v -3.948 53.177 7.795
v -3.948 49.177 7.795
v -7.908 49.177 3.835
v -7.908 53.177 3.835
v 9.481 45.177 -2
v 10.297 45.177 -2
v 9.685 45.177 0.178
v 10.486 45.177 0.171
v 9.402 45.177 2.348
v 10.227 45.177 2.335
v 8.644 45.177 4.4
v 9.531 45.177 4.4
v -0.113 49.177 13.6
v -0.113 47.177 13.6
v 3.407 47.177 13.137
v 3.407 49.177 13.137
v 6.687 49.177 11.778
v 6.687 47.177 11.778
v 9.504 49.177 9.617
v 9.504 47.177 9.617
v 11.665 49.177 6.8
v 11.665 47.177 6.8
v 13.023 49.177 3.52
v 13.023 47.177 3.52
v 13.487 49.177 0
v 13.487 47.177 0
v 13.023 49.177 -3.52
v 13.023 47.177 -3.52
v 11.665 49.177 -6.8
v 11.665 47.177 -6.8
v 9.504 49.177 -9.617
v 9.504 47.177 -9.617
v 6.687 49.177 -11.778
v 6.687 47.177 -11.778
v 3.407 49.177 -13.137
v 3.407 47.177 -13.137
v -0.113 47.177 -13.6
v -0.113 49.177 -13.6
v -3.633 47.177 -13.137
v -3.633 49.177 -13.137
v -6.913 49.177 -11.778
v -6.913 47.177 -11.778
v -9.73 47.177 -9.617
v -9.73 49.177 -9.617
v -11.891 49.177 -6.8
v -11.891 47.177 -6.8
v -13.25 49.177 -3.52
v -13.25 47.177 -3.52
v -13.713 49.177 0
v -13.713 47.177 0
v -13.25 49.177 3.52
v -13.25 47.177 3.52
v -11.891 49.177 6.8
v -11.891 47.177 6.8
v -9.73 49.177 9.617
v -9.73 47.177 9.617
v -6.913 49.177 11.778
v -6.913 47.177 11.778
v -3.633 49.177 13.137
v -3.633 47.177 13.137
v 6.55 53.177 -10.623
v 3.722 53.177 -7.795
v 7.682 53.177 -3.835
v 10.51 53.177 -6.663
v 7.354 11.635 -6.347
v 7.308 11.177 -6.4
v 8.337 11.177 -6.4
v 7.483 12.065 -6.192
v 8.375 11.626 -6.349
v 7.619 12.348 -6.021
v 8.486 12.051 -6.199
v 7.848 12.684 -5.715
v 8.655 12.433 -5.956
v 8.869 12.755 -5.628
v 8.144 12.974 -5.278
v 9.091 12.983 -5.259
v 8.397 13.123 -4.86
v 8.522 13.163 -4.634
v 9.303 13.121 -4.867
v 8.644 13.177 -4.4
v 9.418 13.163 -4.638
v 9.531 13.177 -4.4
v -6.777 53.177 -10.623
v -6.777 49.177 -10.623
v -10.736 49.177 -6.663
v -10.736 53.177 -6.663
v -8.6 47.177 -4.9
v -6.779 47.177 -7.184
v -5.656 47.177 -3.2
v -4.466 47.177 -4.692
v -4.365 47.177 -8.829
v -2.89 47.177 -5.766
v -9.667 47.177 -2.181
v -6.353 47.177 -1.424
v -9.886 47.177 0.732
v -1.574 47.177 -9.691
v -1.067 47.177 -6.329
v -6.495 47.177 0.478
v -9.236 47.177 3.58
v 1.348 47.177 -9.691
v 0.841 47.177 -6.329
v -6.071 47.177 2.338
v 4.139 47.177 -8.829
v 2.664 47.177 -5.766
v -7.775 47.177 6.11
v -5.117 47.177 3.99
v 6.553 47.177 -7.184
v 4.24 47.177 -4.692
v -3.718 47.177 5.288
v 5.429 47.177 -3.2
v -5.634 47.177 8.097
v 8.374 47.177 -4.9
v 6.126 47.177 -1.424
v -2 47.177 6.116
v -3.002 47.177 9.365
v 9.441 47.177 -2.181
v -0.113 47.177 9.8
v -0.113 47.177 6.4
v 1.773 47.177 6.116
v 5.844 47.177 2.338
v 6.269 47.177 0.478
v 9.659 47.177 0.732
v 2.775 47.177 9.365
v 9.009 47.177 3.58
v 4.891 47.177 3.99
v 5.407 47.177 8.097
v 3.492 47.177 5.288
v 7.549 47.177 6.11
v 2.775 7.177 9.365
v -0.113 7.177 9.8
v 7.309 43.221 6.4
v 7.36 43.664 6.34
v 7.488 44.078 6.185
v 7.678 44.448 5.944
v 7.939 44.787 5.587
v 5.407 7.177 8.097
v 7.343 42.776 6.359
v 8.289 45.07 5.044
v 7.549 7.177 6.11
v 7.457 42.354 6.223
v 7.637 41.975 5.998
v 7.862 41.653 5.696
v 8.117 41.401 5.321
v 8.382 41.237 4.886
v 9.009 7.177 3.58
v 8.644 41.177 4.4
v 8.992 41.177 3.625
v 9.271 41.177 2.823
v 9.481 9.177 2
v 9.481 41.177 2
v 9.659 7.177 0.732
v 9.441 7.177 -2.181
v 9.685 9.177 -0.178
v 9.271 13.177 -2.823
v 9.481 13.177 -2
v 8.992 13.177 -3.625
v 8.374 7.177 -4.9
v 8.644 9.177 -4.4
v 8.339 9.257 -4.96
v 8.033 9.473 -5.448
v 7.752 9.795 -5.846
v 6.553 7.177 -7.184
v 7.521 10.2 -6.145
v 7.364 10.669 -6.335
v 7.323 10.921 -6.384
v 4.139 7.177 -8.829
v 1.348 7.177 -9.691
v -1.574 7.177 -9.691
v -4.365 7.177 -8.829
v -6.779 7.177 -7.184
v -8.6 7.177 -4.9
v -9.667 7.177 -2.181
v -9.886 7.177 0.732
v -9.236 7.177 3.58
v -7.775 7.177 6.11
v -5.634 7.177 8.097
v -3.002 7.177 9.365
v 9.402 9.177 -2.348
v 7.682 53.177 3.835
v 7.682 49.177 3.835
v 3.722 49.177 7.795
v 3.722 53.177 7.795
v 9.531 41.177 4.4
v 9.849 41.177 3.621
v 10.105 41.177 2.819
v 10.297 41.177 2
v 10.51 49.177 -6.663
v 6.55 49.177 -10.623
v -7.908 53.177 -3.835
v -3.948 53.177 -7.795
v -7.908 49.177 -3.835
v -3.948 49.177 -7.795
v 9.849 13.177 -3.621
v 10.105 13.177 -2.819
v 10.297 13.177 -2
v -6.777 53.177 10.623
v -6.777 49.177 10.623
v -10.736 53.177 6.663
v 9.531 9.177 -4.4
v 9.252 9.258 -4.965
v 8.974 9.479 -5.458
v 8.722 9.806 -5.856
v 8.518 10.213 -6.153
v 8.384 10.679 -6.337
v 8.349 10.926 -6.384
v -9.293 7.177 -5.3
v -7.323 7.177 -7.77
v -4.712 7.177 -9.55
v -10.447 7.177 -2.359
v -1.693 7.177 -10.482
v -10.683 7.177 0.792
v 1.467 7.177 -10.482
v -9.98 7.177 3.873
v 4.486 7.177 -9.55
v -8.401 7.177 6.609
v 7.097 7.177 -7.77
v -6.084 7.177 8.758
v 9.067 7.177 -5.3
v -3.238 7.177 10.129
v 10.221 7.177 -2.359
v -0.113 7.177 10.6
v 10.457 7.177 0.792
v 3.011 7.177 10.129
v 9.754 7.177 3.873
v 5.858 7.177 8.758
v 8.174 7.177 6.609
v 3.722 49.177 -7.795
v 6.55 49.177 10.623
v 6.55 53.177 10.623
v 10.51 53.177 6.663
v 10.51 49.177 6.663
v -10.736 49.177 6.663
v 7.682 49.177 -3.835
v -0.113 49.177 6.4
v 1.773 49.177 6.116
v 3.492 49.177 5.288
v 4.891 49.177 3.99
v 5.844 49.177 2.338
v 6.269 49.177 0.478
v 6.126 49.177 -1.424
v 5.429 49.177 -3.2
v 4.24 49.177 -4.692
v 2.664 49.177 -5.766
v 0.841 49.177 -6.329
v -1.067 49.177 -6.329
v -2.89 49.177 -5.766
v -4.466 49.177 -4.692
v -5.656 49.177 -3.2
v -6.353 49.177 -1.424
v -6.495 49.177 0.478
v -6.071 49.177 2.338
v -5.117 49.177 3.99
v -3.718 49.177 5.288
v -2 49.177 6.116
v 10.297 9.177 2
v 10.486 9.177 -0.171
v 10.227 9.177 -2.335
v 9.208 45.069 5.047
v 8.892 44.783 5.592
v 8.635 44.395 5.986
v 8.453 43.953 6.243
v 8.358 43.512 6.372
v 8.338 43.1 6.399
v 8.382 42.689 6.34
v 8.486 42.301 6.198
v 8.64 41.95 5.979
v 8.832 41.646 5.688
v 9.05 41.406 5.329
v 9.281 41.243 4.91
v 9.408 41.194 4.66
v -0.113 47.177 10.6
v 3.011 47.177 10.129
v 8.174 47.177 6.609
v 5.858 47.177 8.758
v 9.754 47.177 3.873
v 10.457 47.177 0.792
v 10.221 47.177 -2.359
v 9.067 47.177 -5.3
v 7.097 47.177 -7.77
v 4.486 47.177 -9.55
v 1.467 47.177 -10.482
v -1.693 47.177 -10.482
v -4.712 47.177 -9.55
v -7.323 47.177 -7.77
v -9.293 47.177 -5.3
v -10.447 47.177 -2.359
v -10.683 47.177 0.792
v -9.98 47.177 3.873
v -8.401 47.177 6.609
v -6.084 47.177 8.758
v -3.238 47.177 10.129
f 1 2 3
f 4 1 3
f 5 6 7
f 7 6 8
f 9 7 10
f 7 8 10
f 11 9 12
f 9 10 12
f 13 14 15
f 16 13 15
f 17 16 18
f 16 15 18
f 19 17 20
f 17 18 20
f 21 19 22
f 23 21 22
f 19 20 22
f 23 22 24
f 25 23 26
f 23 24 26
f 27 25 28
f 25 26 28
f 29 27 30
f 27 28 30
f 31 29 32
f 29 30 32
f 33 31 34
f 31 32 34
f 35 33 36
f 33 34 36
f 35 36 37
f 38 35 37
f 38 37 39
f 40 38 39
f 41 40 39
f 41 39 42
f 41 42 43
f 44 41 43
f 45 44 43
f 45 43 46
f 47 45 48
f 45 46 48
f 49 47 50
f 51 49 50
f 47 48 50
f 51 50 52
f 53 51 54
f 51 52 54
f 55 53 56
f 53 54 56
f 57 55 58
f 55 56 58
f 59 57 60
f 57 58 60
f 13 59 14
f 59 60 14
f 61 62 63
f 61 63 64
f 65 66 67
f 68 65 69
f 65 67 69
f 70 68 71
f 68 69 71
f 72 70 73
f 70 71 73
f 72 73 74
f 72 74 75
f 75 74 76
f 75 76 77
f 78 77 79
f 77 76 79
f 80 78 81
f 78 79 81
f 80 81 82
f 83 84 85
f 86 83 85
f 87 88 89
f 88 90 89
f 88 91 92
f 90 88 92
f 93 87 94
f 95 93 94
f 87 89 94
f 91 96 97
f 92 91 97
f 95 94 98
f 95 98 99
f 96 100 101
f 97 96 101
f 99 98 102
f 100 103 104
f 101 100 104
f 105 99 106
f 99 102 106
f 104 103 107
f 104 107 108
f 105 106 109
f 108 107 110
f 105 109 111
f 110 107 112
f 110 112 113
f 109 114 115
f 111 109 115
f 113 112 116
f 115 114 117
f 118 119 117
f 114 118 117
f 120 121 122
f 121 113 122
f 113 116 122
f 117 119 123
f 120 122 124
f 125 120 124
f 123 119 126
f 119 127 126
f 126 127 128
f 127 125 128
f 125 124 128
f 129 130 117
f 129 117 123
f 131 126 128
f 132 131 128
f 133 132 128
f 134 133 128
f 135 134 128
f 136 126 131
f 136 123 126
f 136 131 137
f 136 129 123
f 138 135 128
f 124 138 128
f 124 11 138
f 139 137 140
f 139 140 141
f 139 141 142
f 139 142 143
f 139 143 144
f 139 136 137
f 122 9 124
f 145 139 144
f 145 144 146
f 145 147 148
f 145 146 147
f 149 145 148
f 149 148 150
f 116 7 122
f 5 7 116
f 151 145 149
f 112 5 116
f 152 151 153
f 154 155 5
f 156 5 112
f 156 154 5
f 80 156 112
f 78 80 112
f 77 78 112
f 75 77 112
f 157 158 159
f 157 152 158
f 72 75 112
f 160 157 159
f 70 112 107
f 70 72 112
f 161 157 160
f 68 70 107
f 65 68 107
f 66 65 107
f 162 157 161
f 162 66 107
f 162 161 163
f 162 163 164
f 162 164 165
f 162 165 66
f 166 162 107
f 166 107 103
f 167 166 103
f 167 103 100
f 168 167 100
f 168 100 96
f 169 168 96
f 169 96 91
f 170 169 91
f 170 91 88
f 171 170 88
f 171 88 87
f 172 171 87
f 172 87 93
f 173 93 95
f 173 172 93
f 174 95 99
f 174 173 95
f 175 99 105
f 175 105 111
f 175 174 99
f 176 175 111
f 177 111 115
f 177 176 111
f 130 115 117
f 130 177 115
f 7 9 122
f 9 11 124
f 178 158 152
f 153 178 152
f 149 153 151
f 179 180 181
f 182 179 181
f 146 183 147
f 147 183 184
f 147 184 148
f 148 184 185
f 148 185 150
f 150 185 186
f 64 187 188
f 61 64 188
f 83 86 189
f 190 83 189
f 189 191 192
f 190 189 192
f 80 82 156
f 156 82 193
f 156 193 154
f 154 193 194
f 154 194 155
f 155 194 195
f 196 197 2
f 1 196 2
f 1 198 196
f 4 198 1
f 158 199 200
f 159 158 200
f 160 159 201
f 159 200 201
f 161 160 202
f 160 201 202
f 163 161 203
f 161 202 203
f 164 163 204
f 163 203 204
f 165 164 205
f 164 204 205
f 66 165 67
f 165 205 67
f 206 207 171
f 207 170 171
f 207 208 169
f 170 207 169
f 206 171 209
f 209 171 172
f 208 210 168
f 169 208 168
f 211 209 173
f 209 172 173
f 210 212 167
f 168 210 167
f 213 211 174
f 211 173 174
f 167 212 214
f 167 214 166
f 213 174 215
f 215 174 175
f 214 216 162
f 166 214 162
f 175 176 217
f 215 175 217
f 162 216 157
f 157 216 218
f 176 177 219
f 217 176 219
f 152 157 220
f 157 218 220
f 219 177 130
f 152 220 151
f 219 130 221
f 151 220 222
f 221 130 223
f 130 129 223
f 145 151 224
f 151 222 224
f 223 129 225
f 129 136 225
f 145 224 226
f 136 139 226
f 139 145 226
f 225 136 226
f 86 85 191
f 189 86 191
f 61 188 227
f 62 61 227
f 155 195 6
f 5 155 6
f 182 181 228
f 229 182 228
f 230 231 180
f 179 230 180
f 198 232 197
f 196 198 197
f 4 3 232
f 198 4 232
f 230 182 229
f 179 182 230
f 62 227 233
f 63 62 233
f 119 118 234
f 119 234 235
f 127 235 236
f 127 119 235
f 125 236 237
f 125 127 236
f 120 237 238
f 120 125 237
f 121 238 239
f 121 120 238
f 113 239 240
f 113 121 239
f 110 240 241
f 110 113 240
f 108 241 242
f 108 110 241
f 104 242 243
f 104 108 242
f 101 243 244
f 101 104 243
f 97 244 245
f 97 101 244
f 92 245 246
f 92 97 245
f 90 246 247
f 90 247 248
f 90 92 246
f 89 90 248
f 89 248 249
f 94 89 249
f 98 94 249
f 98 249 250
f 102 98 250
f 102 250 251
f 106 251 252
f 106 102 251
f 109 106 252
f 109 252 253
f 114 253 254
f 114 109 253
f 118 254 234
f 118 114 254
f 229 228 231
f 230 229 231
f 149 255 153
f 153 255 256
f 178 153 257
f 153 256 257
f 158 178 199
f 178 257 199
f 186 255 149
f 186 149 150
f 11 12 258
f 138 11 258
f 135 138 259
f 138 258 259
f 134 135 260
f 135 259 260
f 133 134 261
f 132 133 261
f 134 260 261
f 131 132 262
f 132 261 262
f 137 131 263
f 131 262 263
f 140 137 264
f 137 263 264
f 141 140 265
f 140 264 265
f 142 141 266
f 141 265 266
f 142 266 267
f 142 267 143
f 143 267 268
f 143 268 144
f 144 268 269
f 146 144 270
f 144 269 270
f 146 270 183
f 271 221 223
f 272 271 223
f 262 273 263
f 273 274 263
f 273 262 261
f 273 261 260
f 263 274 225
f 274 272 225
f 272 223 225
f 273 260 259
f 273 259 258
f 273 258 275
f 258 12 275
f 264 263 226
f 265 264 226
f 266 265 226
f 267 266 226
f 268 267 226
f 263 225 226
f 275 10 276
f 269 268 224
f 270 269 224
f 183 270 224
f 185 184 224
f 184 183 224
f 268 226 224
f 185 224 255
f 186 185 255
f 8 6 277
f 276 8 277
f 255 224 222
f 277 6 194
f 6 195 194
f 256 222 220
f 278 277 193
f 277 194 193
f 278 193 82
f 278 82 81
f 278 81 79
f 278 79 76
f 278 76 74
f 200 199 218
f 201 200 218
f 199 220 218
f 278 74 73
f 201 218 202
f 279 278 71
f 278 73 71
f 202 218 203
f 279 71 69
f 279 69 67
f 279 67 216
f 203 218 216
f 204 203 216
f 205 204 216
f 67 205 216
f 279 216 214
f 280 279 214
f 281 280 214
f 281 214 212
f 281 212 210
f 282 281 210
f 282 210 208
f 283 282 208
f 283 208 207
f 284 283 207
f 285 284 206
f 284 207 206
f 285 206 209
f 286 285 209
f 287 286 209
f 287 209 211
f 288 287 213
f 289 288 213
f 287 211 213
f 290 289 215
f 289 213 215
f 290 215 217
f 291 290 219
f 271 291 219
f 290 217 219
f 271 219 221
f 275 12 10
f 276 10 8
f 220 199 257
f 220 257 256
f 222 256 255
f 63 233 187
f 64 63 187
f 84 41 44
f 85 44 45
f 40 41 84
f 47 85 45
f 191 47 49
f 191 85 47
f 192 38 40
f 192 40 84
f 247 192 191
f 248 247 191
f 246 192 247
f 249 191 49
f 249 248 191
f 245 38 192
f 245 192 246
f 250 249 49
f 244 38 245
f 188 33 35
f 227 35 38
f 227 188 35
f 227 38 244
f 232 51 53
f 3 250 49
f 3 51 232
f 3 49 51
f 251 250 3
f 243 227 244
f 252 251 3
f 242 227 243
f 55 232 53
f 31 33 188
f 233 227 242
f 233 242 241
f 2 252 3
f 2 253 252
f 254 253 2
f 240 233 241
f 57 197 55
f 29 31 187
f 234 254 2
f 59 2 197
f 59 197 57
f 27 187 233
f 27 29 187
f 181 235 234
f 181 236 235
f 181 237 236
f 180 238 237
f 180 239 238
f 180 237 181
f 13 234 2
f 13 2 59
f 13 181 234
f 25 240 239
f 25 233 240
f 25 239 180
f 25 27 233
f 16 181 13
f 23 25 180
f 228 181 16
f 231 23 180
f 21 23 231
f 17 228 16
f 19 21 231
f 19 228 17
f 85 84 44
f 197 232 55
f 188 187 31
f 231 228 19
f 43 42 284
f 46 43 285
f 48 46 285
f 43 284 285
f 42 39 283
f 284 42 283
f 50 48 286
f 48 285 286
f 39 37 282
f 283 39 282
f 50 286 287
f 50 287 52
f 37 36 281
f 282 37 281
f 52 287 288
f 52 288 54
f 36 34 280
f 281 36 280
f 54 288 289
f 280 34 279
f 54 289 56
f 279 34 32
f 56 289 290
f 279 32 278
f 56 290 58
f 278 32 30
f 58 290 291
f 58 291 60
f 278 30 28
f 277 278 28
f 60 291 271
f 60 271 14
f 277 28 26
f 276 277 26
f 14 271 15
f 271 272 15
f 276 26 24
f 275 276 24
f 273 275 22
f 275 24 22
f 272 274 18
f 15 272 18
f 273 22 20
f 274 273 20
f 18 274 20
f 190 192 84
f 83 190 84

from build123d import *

# Parameters (mm, degrees)
SKETCH2_R           = 13.25
SKETCH2_R_2         = 12.25
BOSS_EXTRUDE1_DEPTH = 50
SKETCH4_W           = 5
SKETCH4_H           = 45
CUT_EXTRUDE2_DEPTH  = 5
SKETCH6_R           = 17
SKETCH6_R_2         = 8
BOSS_EXTRUDE3_DEPTH = 2.5
BOSS_EXTRUDE4_DEPTH = 5
SCALE1_SCALE        = 0.8


with BuildPart() as part:
    # Sketch2 → Boss-Extrude1 (new body)
    with BuildSketch(Plane(origin=(0, 0, 0), x_dir=(1, 0, 0), z_dir=(0, 1, 0))):
        with Locations(Location((0, 0, 0), (0, 0, 270))):
            Circle(SKETCH2_R)
        with Locations(Location((0, 0, 0), (0, 0, 270))):
            Circle(SKETCH2_R_2, mode=Mode.SUBTRACT)
    extrude(amount=BOSS_EXTRUDE1_DEPTH)

    # Sketch4 → Cut-Extrude2 (cut)
    with BuildSketch(Plane(origin=(13.25, 0, 0), x_dir=(0, 0, -1), z_dir=(1, 0, 0))):
        with BuildLine():
            ThreePointArc((-3, 45), (-3.732233047, 46.767766953), (-5.5, 47.5))
            Line((-5.5, 47.5), (-5.5, 42.5))
            ThreePointArc((-5.5, 42.5), (-3.732233047, 43.232233047), (-3, 45))
        make_face()
        with BuildLine():
            Line((-5.5, 42.5), (-5.5, 47.5))
            ThreePointArc((-5.5, 47.5), (-8, 45), (-5.5, 42.5))
        make_face()
        with Locations((0, 25)):
            Rectangle(SKETCH4_W, SKETCH4_H)
        with BuildLine():
            ThreePointArc((8, 5), (7.267766953, 6.767766953), (5.5, 7.5))
            Line((5.5, 7.5), (5.5, 2.5))
            ThreePointArc((5.5, 2.5), (7.267766953, 3.232233047), (8, 5))
        make_face()
        with BuildLine():
            Line((5.5, 2.5), (5.5, 7.5))
            ThreePointArc((5.5, 7.5), (3, 5), (5.5, 2.5))
        make_face()
        with BuildLine():
            Line((5.5, 7.5), (2.5, 7.5))
            Line((2.5, 7.5), (2.5, 2.5))
            Line((2.5, 2.5), (5.5, 2.5))
            ThreePointArc((5.5, 2.5), (3, 5), (5.5, 7.5))
        make_face()
        with BuildLine():
            Line((-2.5, 42.5), (-2.5, 47.5))
            Line((-2.5, 47.5), (-5.5, 47.5))
            ThreePointArc((-5.5, 47.5), (-3.732233047, 46.767766953), (-3, 45))
            ThreePointArc((-3, 45), (-3.732233047, 43.232233047), (-5.5, 42.5))
            Line((-5.5, 42.5), (-2.5, 42.5))
        make_face()
    extrude(amount=-CUT_EXTRUDE2_DEPTH, mode=Mode.SUBTRACT)

    # Sketch6 → Boss-Extrude3 (add)
    with BuildSketch(Plane(origin=(0, 50, 0), x_dir=(1, 0, 0), z_dir=(0, 1, 0))):
        with Locations(Location((0, 0, 0), (0, 0, 270))):
            Circle(SKETCH6_R)
        with Locations(Location((0, 0, 0), (0, 0, 270))):
            Circle(SKETCH6_R_2, mode=Mode.SUBTRACT)
    extrude(amount=BOSS_EXTRUDE3_DEPTH)

    # Sketch7 → Boss-Extrude4 (add)
    with BuildSketch(Plane(origin=(0, 52.5, 0), x_dir=(1, 0, 0), z_dir=(0, 1, 0))):
        with BuildLine():
            ThreePointArc((9.369164851, -9.369164851), (8.037023703, -10.534170589), (6.561511052, -11.51125852))
            Line((6.561511052, -11.51125852), (8.329278005, -13.279025473))
            Line((8.329278005, -13.279025473), (13.279025473, -8.329278005))
            Line((13.279025473, -8.329278005), (11.51125852, -6.561511052))
            ThreePointArc((11.51125852, -6.561511052), (10.534170589, -8.037023703), (9.369164851, -9.369164851))
        make_face()
        with BuildLine():
            ThreePointArc((-6.561511052, -11.51125852), (-8.037023703, -10.534170589), (-9.369164851, -9.369164851))
            ThreePointArc((-9.369164851, -9.369164851), (-10.534170589, -8.037023703), (-11.51125852, -6.561511052))
            Line((-11.51125852, -6.561511052), (-13.279025473, -8.329278005))
            Line((-13.279025473, -8.329278005), (-8.329278005, -13.279025473))
            Line((-8.329278005, -13.279025473), (-6.561511052, -11.51125852))
        make_face()
        with BuildLine():
            Line((-13.279025473, 8.329278005), (-11.51125852, 6.561511052))
            ThreePointArc((-11.51125852, 6.561511052), (-10.534170589, 8.037023703), (-9.369164851, 9.369164851))
            ThreePointArc((-9.369164851, 9.369164851), (-8.037023703, 10.534170589), (-6.561511052, 11.51125852))
            Line((-6.561511052, 11.51125852), (-8.329278005, 13.279025473))
            Line((-8.329278005, 13.279025473), (-13.279025473, 8.329278005))
        make_face()
        with BuildLine():
            ThreePointArc((-6.561511052, 11.51125852), (-8.037023703, 10.534170589), (-9.369164851, 9.369164851))
            Line((-9.369164851, 9.369164851), (-5.168070815, 9.369164851))
            Line((-5.168070815, 9.369164851), (-4.793744099, 9.743491567))
            Line((-4.793744099, 9.743491567), (-6.561511052, 11.51125852))
        make_face()
        with BuildLine():
            Line((-9.743491567, 4.793744099), (-9.369164851, 5.168070815))
            Line((-9.369164851, 5.168070815), (-9.369164851, 9.369164851))
            ThreePointArc((-9.369164851, 9.369164851), (-10.534170589, 8.037023703), (-11.51125852, 6.561511052))
            Line((-11.51125852, 6.561511052), (-9.743491567, 4.793744099))
        make_face()
        Polygon((-9.369164851, 9.369164851), (-9.369164851, 5.168070815), (-5.168070815, 9.369164851), align=None)
        with BuildLine():
            Line((-5.168070815, -9.369164851), (-9.369164851, -9.369164851))
            ThreePointArc((-9.369164851, -9.369164851), (-8.037023703, -10.534170589), (-6.561511052, -11.51125852))
            Line((-6.561511052, -11.51125852), (-4.793744099, -9.743491567))
            Line((-4.793744099, -9.743491567), (-5.168070815, -9.369164851))
        make_face()
        Polygon((-9.369164851, -5.168070815), (-9.369164851, -9.369164851), (-5.168070815, -9.369164851), align=None)
        with BuildLine():
            ThreePointArc((-11.51125852, -6.561511052), (-10.534170589, -8.037023703), (-9.369164851, -9.369164851))
            Line((-9.369164851, -9.369164851), (-9.369164851, -5.168070815))
            Line((-9.369164851, -5.168070815), (-9.743491567, -4.793744099))
            Line((-9.743491567, -4.793744099), (-11.51125852, -6.561511052))
        make_face()
        with BuildLine():
            Line((9.369164851, -5.168070815), (9.369164851, -9.369164851))
            ThreePointArc((9.369164851, -9.369164851), (10.534170589, -8.037023703), (11.51125852, -6.561511052))
            Line((11.51125852, -6.561511052), (9.743491567, -4.793744099))
            Line((9.743491567, -4.793744099), (9.369164851, -5.168070815))
        make_face()
        Polygon((9.369164851, -5.168070815), (5.168070815, -9.369164851), (9.369164851, -9.369164851), align=None)
        with BuildLine():
            Line((9.369164851, -9.369164851), (5.168070815, -9.369164851))
            Line((5.168070815, -9.369164851), (4.793744099, -9.743491567))
            Line((4.793744099, -9.743491567), (6.561511052, -11.51125852))
            ThreePointArc((6.561511052, -11.51125852), (8.037023703, -10.534170589), (9.369164851, -9.369164851))
        make_face()
        with BuildLine():
            ThreePointArc((6.561511052, 11.51125852), (8.037023703, 10.534170589), (9.369164851, 9.369164851))
            ThreePointArc((9.369164851, 9.369164851), (10.534170589, 8.037023703), (11.51125852, 6.561511052))
            Line((11.51125852, 6.561511052), (13.279025473, 8.329278005))
            Line((13.279025473, 8.329278005), (8.329278005, 13.279025473))
            Line((8.329278005, 13.279025473), (6.561511052, 11.51125852))
        make_face()
        with BuildLine():
            Line((4.793744099, 9.743491567), (5.168070815, 9.369164851))
            Line((5.168070815, 9.369164851), (9.369164851, 9.369164851))
            ThreePointArc((9.369164851, 9.369164851), (8.037023703, 10.534170589), (6.561511052, 11.51125852))
            Line((6.561511052, 11.51125852), (4.793744099, 9.743491567))
        make_face()
        Polygon((5.168070815, 9.369164851), (9.369164851, 5.168070815), (9.369164851, 9.369164851), align=None)
        with BuildLine():
            Line((9.369164851, 9.369164851), (9.369164851, 5.168070815))
            Line((9.369164851, 5.168070815), (9.743491567, 4.793744099))
            Line((9.743491567, 4.793744099), (11.51125852, 6.561511052))
            ThreePointArc((11.51125852, 6.561511052), (10.534170589, 8.037023703), (9.369164851, 9.369164851))
        make_face()
    extrude(amount=BOSS_EXTRUDE4_DEPTH)


with BuildPart() as part_1:
    # Scale1: scaled about (-0.56553808, 35.88383974, 2.07e-07)
    add(part.part.scale(SCALE1_SCALE).moved(Location((-0.113107616, 7.176767948, 4.1e-08))))


solid = part_1.part
